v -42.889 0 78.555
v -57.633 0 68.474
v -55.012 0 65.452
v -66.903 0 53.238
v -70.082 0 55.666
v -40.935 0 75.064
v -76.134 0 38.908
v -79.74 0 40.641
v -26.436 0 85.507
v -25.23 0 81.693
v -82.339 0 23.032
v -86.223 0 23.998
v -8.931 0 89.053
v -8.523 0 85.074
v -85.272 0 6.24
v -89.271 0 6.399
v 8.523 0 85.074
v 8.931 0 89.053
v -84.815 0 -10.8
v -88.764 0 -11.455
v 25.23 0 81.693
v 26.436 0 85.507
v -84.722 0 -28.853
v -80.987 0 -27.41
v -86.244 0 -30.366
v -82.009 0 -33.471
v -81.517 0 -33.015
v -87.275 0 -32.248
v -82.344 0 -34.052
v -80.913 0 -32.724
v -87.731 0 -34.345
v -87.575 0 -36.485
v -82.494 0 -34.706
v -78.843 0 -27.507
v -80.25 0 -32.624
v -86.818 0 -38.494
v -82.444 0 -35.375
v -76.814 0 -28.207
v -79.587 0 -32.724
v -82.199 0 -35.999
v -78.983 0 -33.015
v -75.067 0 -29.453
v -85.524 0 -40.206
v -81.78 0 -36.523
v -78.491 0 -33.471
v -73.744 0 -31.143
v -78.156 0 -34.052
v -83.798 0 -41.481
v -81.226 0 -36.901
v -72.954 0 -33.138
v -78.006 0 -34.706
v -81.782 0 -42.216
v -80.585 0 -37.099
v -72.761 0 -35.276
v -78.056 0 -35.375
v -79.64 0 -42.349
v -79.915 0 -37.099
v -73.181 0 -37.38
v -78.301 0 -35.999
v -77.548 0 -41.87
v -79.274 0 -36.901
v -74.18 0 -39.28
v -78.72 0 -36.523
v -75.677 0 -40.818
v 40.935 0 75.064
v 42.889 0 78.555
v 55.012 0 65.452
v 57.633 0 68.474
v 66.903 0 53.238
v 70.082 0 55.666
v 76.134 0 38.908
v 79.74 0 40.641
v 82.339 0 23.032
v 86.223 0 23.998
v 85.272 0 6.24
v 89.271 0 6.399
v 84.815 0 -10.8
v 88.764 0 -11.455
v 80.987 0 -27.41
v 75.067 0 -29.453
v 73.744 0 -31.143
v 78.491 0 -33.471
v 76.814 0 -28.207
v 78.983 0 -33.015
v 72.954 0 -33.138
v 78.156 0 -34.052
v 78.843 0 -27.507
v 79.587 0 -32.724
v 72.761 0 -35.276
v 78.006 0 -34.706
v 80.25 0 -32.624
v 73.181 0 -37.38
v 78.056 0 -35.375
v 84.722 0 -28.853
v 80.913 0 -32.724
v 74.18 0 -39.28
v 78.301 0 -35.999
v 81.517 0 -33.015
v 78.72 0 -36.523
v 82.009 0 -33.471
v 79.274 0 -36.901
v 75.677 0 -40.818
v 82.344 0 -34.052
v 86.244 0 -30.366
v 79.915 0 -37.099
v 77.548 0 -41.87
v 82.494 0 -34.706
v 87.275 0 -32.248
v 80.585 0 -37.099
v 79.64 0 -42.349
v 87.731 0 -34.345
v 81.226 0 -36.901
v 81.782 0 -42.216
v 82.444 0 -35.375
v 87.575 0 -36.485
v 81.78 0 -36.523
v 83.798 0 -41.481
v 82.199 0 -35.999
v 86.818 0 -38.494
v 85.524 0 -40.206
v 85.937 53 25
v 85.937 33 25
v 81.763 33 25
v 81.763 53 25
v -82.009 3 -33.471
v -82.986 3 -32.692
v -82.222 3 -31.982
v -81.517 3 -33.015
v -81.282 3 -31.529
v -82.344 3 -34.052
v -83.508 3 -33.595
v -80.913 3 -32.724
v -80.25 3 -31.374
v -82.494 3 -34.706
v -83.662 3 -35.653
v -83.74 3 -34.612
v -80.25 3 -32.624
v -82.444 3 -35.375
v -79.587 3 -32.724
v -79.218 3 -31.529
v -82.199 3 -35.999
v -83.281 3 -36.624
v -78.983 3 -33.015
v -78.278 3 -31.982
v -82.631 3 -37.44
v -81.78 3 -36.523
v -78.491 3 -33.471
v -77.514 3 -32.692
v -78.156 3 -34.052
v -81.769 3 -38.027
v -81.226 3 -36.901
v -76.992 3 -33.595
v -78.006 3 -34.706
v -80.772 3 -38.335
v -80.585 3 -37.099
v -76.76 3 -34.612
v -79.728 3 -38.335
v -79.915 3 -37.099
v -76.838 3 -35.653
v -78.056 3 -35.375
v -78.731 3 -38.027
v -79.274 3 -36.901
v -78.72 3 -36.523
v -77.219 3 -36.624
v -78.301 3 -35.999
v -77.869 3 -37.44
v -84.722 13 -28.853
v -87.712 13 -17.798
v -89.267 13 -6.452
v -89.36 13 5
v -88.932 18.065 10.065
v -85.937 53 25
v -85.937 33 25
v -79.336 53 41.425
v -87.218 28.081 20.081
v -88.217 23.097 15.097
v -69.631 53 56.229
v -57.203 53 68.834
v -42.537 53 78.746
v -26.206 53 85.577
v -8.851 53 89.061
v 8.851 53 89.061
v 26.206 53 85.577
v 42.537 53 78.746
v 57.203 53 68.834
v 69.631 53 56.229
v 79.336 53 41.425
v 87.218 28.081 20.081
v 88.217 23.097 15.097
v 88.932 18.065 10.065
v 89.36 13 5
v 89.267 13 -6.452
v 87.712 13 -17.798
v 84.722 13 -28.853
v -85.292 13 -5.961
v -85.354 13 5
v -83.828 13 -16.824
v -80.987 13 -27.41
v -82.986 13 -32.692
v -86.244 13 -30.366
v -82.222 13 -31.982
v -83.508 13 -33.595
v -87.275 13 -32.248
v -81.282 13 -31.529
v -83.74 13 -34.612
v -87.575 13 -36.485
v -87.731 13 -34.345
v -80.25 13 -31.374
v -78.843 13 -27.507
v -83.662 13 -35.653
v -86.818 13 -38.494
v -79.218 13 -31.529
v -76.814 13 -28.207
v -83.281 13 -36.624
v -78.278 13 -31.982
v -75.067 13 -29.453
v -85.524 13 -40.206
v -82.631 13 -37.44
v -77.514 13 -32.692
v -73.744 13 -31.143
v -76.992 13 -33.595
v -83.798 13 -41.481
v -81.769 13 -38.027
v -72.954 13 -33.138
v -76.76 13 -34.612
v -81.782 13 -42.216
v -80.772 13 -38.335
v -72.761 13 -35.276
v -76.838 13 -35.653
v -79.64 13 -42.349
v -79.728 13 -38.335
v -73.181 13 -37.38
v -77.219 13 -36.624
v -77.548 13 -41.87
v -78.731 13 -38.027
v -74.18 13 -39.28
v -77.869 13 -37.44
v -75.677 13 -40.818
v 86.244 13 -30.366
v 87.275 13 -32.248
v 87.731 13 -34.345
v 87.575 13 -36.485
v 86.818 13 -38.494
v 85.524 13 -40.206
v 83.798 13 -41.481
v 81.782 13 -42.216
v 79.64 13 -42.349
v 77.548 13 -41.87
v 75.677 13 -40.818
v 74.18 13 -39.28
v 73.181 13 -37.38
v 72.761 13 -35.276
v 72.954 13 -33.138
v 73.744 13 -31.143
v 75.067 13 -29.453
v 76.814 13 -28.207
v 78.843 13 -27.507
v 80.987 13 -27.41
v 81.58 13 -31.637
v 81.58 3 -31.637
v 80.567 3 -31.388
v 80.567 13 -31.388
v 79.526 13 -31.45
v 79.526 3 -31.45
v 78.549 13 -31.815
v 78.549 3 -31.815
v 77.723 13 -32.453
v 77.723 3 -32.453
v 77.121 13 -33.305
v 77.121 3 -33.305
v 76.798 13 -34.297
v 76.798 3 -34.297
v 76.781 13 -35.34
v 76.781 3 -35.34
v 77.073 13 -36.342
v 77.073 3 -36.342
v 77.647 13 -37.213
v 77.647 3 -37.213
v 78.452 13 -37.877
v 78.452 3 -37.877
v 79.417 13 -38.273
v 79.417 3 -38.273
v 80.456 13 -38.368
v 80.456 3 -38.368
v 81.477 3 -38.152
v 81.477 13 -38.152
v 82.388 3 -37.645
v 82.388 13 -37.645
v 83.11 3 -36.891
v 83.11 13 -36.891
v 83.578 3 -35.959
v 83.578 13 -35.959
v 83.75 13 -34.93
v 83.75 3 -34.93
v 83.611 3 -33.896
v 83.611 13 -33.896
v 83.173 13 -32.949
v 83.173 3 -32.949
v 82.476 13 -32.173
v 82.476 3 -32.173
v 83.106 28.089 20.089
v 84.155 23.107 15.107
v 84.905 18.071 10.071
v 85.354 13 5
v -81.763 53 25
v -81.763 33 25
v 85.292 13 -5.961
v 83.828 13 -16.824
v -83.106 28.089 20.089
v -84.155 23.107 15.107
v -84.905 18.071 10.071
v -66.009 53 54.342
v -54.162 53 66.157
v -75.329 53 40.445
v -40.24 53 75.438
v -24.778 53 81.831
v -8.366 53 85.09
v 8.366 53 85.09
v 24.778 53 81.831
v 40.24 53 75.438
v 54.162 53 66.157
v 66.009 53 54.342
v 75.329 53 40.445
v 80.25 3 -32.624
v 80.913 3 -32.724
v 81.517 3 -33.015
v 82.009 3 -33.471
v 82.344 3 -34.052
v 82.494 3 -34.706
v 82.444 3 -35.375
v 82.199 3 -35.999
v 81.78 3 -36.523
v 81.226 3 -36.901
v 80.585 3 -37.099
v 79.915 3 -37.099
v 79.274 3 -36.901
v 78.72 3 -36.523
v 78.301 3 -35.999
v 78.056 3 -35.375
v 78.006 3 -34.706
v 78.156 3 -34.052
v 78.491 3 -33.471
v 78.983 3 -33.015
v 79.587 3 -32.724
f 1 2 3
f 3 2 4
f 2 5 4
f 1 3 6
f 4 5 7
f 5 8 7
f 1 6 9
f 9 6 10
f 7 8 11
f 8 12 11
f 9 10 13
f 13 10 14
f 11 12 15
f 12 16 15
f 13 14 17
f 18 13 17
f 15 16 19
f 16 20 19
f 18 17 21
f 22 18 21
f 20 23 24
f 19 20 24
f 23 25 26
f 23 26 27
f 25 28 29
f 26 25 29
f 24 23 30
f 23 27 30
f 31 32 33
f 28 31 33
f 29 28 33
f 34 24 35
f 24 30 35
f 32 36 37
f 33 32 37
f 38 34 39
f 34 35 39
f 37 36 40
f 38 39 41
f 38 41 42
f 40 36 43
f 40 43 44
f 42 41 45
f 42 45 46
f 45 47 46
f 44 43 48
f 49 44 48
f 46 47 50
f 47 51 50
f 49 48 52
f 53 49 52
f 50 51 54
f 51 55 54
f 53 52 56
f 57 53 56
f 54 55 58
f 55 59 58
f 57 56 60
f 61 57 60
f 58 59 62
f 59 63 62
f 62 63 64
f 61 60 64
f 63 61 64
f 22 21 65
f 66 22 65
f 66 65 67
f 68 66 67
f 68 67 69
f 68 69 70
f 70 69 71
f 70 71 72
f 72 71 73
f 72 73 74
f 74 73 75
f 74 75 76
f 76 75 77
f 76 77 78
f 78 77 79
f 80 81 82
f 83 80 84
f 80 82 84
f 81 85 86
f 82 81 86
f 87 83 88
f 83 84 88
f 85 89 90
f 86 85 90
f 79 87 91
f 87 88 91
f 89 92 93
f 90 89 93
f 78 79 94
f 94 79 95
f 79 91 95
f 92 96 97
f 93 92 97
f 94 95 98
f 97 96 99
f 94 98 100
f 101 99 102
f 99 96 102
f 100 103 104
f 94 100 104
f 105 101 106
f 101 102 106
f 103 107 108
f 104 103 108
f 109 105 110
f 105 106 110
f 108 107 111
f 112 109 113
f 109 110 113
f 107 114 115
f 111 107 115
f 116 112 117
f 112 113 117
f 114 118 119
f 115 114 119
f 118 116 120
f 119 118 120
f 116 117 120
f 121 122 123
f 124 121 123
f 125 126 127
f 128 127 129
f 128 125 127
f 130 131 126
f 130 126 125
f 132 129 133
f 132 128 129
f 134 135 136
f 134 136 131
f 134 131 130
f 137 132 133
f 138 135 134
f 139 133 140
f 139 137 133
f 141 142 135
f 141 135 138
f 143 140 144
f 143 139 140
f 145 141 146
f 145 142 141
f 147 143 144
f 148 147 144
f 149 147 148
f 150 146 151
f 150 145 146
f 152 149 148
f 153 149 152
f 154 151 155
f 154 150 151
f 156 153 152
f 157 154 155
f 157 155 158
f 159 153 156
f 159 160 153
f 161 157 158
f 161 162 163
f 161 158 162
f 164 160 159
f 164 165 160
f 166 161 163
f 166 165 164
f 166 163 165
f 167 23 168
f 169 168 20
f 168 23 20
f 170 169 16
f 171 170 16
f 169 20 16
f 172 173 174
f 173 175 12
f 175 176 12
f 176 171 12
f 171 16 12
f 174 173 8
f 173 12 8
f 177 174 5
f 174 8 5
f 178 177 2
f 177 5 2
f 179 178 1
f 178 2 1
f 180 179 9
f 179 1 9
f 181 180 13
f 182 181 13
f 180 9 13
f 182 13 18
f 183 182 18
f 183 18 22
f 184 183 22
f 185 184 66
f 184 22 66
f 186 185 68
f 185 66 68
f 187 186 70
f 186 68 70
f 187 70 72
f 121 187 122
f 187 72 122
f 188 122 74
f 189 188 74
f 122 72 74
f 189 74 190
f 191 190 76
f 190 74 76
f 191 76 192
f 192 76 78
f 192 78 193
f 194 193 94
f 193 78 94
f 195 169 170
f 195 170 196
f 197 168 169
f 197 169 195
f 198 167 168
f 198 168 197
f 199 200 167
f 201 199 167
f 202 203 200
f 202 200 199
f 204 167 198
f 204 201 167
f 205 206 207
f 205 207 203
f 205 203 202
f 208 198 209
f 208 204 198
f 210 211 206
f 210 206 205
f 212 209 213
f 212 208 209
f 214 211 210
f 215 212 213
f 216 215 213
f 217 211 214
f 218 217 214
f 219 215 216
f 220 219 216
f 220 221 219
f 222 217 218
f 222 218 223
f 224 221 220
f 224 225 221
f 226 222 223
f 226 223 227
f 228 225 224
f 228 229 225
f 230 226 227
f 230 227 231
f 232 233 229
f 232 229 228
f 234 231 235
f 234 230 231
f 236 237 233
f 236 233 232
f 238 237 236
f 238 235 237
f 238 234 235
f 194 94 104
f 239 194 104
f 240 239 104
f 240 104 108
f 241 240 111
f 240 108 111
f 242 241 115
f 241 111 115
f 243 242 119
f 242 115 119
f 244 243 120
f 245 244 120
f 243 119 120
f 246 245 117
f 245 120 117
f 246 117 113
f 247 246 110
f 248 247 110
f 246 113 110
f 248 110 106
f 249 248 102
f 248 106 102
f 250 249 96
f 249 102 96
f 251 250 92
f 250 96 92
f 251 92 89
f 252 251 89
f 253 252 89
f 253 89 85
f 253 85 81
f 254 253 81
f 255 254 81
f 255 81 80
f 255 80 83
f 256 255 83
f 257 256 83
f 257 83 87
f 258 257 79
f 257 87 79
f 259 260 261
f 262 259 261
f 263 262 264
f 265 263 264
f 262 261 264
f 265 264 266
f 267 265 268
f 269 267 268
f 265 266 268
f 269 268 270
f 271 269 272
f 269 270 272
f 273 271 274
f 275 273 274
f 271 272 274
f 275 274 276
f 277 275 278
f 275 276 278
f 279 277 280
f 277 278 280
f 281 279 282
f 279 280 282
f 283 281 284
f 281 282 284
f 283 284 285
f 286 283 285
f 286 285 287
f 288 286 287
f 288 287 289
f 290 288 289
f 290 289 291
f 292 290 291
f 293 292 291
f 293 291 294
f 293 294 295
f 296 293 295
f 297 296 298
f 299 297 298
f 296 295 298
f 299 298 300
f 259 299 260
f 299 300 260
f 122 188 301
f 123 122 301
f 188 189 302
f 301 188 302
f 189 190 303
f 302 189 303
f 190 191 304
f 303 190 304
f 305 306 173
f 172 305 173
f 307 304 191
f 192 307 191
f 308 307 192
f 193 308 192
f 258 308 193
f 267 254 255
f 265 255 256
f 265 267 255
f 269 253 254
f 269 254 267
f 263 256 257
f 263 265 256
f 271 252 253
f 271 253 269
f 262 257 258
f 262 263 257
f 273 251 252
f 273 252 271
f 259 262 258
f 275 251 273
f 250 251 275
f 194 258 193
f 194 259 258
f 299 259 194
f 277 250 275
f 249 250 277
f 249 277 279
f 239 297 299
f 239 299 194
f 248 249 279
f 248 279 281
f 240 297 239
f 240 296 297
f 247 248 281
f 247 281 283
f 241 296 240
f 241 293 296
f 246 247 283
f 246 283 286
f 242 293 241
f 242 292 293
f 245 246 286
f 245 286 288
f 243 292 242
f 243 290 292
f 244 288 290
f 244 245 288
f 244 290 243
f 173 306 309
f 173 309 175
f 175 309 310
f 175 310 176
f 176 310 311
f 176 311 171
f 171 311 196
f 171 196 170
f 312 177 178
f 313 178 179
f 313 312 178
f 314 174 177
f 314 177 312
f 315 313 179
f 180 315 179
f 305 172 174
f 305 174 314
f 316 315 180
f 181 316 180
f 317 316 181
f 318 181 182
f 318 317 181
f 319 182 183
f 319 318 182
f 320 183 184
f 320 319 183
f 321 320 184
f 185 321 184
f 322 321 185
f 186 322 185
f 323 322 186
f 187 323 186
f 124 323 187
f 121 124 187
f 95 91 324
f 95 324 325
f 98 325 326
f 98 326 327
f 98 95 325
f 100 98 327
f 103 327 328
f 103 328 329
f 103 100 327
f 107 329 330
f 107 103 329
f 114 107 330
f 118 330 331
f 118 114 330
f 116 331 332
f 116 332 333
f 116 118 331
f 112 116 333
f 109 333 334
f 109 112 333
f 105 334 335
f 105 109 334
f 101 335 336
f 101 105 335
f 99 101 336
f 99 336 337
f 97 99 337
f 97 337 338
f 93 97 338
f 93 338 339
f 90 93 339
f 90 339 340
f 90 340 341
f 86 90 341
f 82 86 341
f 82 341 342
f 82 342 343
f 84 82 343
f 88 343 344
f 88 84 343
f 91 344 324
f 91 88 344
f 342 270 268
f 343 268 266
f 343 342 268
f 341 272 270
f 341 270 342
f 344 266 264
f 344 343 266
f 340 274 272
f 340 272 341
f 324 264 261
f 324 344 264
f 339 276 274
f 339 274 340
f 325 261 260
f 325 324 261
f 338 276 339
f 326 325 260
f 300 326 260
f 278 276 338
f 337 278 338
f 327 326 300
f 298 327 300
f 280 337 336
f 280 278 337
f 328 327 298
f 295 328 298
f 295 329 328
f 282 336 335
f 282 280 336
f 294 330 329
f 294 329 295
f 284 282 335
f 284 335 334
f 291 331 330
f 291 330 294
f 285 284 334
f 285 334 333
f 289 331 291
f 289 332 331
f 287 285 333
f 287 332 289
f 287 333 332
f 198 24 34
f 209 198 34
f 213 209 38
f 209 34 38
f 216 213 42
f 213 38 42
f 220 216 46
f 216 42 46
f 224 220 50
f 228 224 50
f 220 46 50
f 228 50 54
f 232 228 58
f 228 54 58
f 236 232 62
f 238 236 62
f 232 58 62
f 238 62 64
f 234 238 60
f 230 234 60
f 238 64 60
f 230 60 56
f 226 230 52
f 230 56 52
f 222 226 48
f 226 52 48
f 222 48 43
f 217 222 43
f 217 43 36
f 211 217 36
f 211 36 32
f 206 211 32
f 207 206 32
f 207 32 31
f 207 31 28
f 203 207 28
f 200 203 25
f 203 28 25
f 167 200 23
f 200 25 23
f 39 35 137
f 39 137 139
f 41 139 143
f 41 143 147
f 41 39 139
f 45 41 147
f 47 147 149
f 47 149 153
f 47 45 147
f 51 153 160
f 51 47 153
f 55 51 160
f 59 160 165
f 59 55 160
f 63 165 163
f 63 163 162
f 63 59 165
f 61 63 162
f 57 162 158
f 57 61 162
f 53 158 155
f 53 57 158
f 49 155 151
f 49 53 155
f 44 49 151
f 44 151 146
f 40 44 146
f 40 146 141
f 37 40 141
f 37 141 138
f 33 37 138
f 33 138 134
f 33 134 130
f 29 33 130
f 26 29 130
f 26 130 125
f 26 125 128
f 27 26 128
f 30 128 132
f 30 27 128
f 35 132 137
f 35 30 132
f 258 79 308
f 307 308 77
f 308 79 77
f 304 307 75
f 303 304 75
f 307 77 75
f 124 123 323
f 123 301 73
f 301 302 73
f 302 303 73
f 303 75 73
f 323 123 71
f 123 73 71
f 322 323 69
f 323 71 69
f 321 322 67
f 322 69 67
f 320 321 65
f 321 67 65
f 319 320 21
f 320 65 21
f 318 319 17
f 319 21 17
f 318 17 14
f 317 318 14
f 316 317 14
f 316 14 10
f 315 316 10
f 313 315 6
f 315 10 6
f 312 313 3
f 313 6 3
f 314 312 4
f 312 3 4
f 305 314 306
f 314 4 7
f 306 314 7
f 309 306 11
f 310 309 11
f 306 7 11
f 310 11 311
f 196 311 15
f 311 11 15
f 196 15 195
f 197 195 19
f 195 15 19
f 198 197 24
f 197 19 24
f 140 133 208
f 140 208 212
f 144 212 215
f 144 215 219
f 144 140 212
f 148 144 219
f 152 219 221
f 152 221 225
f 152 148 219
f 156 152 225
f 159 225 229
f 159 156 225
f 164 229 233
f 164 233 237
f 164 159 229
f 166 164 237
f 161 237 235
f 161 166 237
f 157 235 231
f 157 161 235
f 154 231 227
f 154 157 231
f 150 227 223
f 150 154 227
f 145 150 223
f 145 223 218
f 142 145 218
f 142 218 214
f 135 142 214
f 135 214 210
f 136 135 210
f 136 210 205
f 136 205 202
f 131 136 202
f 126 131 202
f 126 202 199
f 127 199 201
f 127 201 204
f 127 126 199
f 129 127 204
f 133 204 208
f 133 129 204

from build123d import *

# Parameters (mm, degrees)
SKETCH_1_R      = 2.2499999999999964
SKETCH_1_R_2    = 3.5000000000000075
EXTRUDE_3_DEPTH = 3
EXTRUDE_START   = 3
SKETCH_1_9_R    = 3.5000000000000075
EXTRUDE_4_DEPTH = 10
EXTRUDE_START_2 = 13
EXTRUDE_5_DEPTH = 40
CHAMFER_1_SIZE  = 20


with BuildPart() as part:
    # 草图1 → 凸台-拉伸3 (new body)
    # profile 1 of 5: a face of its own
    with BuildSketch(Plane(origin=(0, 0, 0), x_dir=(1, 0, 0), z_dir=(0, 1, 0))):
        with BuildLine():
            Line((81.76337811025178, -25), (85.93747727272425, -25))
            ThreePointArc((85.93747727272427, -25.00000000000003), (89.47720115518152, 2.0200181769446033), (84.72170874814934, 28.85276532316719))
            ThreePointArc((84.72170874814934, 28.852765323167215), (77.54750127881047, 41.87005748540227), (80.9872265222124, 27.41020138999083))
            ThreePointArc((80.98722652221241, 27.41020138999082), (85.49062597438983, 1.266045223118958), (81.76337811025176, -25.00000000000003))
        make_face()
        with BuildLine():
            ThreePointArc((79.50393531376338, 31.454320365013906), (78.90792202113376, 38.10634440334943), (83.19867820645547, 32.988330432119156))
            ThreePointArc((83.19867820645547, 32.988330432119156), (82.49378450242521, 32.18772445937683), (81.58047617746915, 31.636622870612896))
            ThreePointArc((81.58047617746915, 31.636622870612896), (80.55609271252037, 31.387290279852397), (79.50393531376338, 31.454320365013903))
        make_face(mode=Mode.SUBTRACT)
    # profile 2 of 5: a face of its own
    with BuildSketch(Plane(origin=(0, 0, 0), x_dir=(1, 0, 0), z_dir=(0, 1, 0))):
        with BuildLine():
            ThreePointArc((83.19867820645547, 32.988330432119156), (78.90792202113373, 38.10634440334942), (79.50393531376338, 31.454320365013903))
            ThreePointArc((79.50393531376338, 31.454320365013903), (80.55609271252037, 31.387290279852397), (81.58047617746915, 31.636622870612896))
            ThreePointArc((81.58047617746915, 31.636622870612896), (82.49378450242521, 32.18772445937683), (83.19867820645547, 32.988330432119156))
        make_face()
        with Locations(Location((80.25, 34.873879910328284, 0), (0, 0, 270))):
            Circle(SKETCH_1_R, mode=Mode.SUBTRACT)
    # profile 3 of 5: a face of its own
    with BuildSketch(Plane(origin=(0, 0, 0), x_dir=(1, 0, 0), z_dir=(0, 1, 0))):
        with BuildLine():
            ThreePointArc((-84.72170874814935, 28.85276532316715), (-89.4772011551815, 2.020018176944596), (-85.93747727272427, -25.00000000000001))
            Line((-85.93747727272425, -25), (-81.76337811025178, -25))
            ThreePointArc((-81.76337811025176, -25.000000000000007), (-85.49062597438983, 1.2660452231190007), (-80.98722652221241, 27.41020138999083))
            ThreePointArc((-80.98722652221241, 27.41020138999083), (-77.54750127881069, 41.87005748540241), (-84.72170874814934, 28.852765323167137))
        make_face()
        with Locations((-80.25, 34.873879910328284)):
            Circle(SKETCH_1_R_2, mode=Mode.SUBTRACT)
    # profile 4 of 5: a face of its own
    with BuildSketch(Plane(origin=(0, 0, 0), x_dir=(1, 0, 0), z_dir=(0, 1, 0))):
        with Locations((-80.25, 34.873879910328284)):
            Circle(SKETCH_1_R_2)
        with Locations(Location((-80.25, 34.873879910328284, 0), (0, 0, 270))):
            Circle(SKETCH_1_R, mode=Mode.SUBTRACT)
    # profile 5 of 5: a face of its own
    with BuildSketch(Plane(origin=(0, 0, 0), x_dir=(1, 0, 0), z_dir=(0, 1, 0))):
        with BuildLine():
            Line((-81.76337811025178, -25), (-85.93747727272425, -25))
            ThreePointArc((-85.93747727272427, -25.00000000000001), (3.55e-15, -89.5), (85.93747727272427, -25.00000000000003))
            Line((85.93747727272425, -25), (81.76337811025178, -25))
            ThreePointArc((81.76337811025176, -25.00000000000003), (-3.55e-15, -85.5), (-81.76337811025176, -25.000000000000007))
        make_face()
    extrude(amount=EXTRUDE_3_DEPTH)

    # 草图1<9> → 凸台-拉伸4 (add)
    # profile 1 of 3: a face of its own
    with BuildSketch(Plane(origin=(0, 0, 0), x_dir=(1, 0, 0), z_dir=(0, 1, 0)).offset(EXTRUDE_START)):
        with BuildLine():
            ThreePointArc((-84.72170874814935, 28.85276532316715), (-89.4772011551815, 2.020018176944596), (-85.93747727272427, -25.00000000000001))
            Line((-85.93747727272425, -25), (-81.76337811025178, -25))
            ThreePointArc((-81.76337811025176, -25.000000000000007), (-85.49062597438983, 1.2660452231190007), (-80.98722652221241, 27.41020138999083))
            ThreePointArc((-80.98722652221241, 27.41020138999083), (-77.54750127881069, 41.87005748540241), (-84.72170874814934, 28.852765323167137))
        make_face()
        with Locations(Location((-80.25, 34.873879910328284, 0), (0, 0, 270))):
            Circle(SKETCH_1_9_R, mode=Mode.SUBTRACT)
    # profile 2 of 3: a face of its own
    with BuildSketch(Plane(origin=(0, 0, 0), x_dir=(1, 0, 0), z_dir=(0, 1, 0)).offset(EXTRUDE_START)):
        with BuildLine():
            Line((-81.76337811025178, -25), (-85.93747727272425, -25))
            ThreePointArc((-85.93747727272427, -25.00000000000001), (3.55e-15, -89.5), (85.93747727272427, -25.00000000000003))
            Line((85.93747727272425, -25), (81.76337811025178, -25))
            ThreePointArc((81.76337811025176, -25.00000000000003), (-3.55e-15, -85.5), (-81.76337811025176, -25.000000000000007))
        make_face()
    # profile 3 of 3: a face of its own
    with BuildSketch(Plane(origin=(0, 0, 0), x_dir=(1, 0, 0), z_dir=(0, 1, 0)).offset(EXTRUDE_START)):
        with BuildLine():
            Line((81.76337811025178, -25), (85.93747727272425, -25))
            ThreePointArc((85.93747727272427, -25.00000000000003), (89.47720115518152, 2.0200181769446033), (84.72170874814934, 28.85276532316719))
            ThreePointArc((84.72170874814934, 28.852765323167215), (77.54750127881047, 41.87005748540227), (80.9872265222124, 27.41020138999083))
            ThreePointArc((80.98722652221241, 27.41020138999082), (85.49062597438983, 1.266045223118958), (81.76337811025176, -25.00000000000003))
        make_face()
        with BuildLine():
            ThreePointArc((79.50393531376338, 31.454320365013906), (78.90792202113376, 38.10634440334943), (83.19867820645547, 32.988330432119156))
            ThreePointArc((83.19867820645547, 32.988330432119156), (82.49378450242521, 32.18772445937683), (81.58047617746915, 31.636622870612896))
            ThreePointArc((81.58047617746915, 31.636622870612896), (80.55609271252037, 31.387290279852397), (79.50393531376338, 31.454320365013903))
        make_face(mode=Mode.SUBTRACT)
    extrude(amount=EXTRUDE_4_DEPTH)

    # 草图1<10> → 凸台-拉伸5 (add)
    with BuildSketch(Plane(origin=(0, 0, 0), x_dir=(1, 0, 0), z_dir=(0, 1, 0)).offset(EXTRUDE_START_2)):
        with BuildLine():
            Line((-81.76337811025178, -25), (-85.93747727272425, -25))
            ThreePointArc((-85.93747727272427, -25.00000000000001), (3.55e-15, -89.5), (85.93747727272427, -25.00000000000003))
            Line((85.93747727272425, -25), (81.76337811025178, -25))
            ThreePointArc((81.76337811025176, -25.00000000000003), (-3.55e-15, -85.5), (-81.76337811025176, -25.000000000000007))
        make_face()
    extrude(amount=EXTRUDE_5_DEPTH)

    # 倒角1
    chamfer_1_edges = [part.edges().sort_by_distance(p)[0] for p in [
        (-83.85042769148802, 13, 25),
        (83.85042769148802, 13, 25),
    ]]
    chamfer(chamfer_1_edges, length=CHAMFER_1_SIZE)


solid = part.part
